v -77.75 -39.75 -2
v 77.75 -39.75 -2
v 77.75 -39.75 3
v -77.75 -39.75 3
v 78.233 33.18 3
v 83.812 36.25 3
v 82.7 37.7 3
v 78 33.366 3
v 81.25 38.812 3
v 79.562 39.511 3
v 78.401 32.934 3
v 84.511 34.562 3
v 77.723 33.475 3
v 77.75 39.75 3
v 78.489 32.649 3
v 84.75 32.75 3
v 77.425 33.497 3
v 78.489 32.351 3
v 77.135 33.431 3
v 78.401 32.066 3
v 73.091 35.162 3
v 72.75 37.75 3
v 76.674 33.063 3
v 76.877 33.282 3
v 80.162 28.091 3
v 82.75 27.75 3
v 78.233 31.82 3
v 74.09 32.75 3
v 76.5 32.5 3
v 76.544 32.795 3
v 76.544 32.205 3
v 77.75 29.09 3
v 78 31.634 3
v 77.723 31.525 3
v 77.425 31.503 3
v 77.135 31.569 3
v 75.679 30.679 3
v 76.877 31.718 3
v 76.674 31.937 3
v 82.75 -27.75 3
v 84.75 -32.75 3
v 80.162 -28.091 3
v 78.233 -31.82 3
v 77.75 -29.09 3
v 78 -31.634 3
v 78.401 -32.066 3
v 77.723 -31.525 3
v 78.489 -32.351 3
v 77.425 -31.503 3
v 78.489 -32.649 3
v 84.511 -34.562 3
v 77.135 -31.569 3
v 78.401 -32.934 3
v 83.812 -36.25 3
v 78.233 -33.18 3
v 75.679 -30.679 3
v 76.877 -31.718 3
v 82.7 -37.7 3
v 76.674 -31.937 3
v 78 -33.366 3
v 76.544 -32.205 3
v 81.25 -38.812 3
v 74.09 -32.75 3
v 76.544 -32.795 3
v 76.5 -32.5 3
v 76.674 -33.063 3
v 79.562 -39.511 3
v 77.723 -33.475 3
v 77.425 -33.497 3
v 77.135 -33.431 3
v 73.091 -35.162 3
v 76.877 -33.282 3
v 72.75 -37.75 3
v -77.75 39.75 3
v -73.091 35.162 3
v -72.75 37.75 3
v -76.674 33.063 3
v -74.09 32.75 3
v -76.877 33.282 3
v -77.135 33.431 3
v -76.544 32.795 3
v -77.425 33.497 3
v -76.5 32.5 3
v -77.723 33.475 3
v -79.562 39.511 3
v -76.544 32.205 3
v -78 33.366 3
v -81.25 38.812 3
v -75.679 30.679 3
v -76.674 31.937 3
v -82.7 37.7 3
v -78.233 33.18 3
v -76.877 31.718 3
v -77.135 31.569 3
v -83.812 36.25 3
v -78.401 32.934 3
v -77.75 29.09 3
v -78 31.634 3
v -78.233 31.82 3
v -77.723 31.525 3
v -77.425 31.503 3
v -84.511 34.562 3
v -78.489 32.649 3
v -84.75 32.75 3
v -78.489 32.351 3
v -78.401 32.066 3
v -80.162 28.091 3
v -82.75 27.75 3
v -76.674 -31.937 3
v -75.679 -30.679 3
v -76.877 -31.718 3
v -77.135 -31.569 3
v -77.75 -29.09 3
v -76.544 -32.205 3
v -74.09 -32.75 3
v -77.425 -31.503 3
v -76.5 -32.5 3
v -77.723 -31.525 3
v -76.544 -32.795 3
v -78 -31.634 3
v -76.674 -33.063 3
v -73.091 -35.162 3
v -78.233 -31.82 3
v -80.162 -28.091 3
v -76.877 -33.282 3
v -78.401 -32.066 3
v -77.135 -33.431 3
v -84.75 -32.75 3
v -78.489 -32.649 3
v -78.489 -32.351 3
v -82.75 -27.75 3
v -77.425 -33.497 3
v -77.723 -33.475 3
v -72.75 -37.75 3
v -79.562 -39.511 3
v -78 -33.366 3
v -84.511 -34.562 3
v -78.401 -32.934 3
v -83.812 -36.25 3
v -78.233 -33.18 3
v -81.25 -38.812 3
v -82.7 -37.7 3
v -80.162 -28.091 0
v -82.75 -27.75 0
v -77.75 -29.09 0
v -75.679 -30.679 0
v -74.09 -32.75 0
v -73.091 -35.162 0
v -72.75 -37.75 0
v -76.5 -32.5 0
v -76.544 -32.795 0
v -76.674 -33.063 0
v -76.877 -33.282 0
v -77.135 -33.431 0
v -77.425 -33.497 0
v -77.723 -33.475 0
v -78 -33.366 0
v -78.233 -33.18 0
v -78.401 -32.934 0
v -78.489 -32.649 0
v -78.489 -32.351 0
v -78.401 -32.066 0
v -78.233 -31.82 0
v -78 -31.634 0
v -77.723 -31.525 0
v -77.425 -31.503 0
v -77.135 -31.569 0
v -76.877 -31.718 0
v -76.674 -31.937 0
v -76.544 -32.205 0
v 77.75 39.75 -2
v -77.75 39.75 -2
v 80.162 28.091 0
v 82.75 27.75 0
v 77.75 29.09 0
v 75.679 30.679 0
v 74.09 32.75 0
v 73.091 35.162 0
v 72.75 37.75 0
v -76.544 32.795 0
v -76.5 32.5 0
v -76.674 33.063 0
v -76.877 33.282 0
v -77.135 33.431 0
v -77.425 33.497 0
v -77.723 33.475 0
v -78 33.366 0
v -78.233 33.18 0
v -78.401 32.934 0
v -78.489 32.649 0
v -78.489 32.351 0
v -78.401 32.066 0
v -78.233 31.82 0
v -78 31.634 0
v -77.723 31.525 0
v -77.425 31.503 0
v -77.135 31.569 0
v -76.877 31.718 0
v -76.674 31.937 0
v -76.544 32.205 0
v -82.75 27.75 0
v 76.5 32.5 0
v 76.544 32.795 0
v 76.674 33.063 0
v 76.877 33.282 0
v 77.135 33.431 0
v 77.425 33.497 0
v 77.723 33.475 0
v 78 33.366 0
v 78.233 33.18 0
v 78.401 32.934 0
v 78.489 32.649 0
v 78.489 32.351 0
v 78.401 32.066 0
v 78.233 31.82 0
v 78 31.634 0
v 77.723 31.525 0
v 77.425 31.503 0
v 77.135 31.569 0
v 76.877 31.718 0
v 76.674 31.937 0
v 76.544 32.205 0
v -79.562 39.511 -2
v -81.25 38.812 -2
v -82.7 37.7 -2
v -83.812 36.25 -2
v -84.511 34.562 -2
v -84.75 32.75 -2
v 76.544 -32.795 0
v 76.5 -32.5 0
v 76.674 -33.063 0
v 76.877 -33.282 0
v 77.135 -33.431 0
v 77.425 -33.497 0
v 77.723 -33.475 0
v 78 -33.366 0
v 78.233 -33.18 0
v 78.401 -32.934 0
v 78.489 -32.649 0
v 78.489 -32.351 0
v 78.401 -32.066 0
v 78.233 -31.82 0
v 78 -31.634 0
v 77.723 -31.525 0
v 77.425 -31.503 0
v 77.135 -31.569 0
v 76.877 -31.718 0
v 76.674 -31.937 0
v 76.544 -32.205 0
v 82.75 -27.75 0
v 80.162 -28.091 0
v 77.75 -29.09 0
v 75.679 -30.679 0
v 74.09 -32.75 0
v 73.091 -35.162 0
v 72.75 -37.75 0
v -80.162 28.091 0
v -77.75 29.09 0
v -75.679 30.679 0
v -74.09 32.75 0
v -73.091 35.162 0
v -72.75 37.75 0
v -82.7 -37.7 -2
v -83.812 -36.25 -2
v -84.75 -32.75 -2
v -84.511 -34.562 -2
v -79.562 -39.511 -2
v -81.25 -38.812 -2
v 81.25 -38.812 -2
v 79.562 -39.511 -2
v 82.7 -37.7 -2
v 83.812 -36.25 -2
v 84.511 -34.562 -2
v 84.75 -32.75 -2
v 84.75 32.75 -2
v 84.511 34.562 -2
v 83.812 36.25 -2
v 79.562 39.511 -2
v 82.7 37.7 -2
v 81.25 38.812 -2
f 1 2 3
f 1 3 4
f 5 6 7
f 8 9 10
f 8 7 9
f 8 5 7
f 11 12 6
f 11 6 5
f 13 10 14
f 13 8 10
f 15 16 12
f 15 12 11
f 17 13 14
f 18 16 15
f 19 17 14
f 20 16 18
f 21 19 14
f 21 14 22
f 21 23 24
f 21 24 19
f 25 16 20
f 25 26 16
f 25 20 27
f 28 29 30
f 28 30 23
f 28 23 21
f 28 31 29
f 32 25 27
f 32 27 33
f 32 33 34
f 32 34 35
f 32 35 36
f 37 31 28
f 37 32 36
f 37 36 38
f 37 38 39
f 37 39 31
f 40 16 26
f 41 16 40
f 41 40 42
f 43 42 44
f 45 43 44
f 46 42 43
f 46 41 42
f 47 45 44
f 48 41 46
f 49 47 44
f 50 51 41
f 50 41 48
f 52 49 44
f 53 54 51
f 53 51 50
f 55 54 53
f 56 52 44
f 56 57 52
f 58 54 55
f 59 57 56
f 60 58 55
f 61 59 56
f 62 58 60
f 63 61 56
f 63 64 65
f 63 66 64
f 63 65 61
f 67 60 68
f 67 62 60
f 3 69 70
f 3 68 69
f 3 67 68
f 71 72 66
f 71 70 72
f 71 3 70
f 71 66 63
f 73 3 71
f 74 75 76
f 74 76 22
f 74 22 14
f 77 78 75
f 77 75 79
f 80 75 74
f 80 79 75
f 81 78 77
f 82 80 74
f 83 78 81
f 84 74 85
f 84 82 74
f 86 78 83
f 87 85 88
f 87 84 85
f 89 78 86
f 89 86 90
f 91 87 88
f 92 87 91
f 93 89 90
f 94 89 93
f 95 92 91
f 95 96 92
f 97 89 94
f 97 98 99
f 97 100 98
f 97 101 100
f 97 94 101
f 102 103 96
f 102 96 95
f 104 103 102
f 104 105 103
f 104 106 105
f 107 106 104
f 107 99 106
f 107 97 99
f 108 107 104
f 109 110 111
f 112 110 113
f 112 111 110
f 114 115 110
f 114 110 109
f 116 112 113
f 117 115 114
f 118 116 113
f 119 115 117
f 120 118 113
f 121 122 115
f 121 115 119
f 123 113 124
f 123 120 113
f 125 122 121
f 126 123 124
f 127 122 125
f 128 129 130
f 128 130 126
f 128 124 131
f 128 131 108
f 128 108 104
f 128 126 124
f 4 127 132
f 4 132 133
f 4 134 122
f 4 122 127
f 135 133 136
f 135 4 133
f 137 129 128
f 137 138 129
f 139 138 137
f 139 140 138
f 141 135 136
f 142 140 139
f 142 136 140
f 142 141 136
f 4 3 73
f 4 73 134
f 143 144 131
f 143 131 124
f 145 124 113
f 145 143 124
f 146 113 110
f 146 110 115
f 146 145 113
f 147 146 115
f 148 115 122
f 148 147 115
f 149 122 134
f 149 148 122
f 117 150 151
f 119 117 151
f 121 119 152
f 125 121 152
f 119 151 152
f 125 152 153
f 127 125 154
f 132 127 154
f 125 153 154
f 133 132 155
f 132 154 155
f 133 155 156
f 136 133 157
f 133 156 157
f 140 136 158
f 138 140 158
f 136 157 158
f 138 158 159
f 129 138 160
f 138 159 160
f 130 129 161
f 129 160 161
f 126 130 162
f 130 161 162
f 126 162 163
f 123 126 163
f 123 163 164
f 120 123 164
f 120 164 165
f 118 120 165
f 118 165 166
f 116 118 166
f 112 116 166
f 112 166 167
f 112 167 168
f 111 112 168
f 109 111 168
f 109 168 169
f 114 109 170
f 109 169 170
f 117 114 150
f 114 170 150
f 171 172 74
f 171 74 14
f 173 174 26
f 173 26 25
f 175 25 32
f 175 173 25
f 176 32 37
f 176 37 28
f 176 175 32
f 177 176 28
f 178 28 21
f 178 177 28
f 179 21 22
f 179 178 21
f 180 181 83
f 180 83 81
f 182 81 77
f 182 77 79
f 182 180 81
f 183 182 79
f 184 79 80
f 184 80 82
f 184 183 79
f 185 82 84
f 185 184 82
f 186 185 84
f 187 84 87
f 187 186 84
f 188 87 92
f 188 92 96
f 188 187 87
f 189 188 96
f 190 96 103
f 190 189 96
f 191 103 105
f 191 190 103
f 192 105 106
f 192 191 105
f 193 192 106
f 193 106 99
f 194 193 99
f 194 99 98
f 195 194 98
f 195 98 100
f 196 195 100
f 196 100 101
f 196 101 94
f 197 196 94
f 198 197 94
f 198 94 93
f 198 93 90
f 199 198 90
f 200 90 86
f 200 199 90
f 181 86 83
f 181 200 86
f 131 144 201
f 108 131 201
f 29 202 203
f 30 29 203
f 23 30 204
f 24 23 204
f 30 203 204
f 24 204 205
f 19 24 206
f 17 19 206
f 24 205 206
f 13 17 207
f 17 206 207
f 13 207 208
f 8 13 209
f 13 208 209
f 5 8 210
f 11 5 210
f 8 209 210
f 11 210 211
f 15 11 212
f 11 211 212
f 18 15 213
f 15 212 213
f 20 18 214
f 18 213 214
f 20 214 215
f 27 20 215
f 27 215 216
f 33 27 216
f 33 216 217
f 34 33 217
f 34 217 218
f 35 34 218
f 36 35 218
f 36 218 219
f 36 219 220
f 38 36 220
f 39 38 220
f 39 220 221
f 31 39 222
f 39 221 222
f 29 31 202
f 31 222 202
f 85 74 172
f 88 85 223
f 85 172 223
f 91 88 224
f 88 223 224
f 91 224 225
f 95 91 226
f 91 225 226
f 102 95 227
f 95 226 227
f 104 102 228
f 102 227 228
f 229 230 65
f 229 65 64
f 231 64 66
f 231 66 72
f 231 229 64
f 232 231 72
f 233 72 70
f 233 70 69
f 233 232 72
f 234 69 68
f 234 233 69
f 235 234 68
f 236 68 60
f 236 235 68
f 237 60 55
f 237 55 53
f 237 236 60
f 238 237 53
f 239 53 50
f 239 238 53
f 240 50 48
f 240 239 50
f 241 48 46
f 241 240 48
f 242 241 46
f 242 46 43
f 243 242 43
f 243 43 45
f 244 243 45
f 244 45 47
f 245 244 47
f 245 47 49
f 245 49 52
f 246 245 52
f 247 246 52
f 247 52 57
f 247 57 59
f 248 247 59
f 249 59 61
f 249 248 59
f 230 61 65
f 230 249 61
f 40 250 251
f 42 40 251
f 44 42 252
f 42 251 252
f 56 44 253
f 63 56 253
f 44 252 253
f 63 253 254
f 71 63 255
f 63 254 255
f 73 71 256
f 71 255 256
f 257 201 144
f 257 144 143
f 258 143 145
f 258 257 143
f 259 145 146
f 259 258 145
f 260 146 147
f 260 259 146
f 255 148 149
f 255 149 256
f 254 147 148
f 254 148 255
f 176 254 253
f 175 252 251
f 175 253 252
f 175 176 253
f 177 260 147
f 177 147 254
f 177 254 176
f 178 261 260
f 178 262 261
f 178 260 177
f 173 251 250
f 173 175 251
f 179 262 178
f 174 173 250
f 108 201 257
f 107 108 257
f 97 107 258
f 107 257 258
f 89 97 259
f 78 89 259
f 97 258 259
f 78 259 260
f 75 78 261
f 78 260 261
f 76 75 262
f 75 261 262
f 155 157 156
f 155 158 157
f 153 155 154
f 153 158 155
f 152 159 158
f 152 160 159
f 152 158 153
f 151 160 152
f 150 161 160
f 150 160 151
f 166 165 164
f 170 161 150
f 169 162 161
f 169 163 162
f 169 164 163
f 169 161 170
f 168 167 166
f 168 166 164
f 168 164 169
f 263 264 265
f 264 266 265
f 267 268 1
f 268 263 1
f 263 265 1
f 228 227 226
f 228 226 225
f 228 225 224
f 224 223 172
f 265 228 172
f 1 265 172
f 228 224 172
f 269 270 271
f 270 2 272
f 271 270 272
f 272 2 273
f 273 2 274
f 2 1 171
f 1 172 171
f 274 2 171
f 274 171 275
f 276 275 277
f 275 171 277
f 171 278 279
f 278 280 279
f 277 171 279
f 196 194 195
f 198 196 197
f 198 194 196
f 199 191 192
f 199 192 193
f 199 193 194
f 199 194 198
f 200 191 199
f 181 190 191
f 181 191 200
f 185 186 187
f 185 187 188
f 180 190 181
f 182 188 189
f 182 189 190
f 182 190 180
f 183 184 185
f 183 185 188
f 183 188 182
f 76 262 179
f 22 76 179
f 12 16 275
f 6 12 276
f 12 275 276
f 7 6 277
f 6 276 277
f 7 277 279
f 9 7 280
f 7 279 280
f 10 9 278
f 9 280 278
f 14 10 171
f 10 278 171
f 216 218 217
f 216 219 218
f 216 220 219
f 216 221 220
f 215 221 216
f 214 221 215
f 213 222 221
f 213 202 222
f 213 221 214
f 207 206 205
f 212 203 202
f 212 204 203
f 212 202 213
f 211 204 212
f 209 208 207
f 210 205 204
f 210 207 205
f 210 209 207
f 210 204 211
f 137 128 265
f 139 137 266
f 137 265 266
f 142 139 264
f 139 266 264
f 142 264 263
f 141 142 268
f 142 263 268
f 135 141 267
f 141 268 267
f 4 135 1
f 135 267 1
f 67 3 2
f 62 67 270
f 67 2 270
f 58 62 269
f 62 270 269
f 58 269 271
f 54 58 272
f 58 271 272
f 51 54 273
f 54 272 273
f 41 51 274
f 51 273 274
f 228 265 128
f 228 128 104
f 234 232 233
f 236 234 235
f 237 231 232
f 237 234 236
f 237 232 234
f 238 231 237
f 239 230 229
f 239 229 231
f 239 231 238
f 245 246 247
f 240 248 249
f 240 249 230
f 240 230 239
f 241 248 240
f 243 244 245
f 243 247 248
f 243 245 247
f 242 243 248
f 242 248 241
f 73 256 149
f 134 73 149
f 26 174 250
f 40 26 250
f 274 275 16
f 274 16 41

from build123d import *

# Parameters (mm, degrees)
PAD_DEPTH               = 3
THICKNESS_T             = 2
SKETCH001_R             = 1
PAD001_DEPTH            = 3
SKETCH001_MIRRORED_2_R  = 1
PAD001_MIRRORED_2_DEPTH = 3


with BuildPart() as part:
    # Sketch → Pad (new body)
    with BuildSketch(Plane.XY):
        with BuildLine():
            ThreePointArc((-77.75, 37.75), (-81.285534, 36.285534), (-82.75, 32.75))
            Line((-82.75, -32.75), (-82.75, 32.75))
            ThreePointArc((-82.75, -32.75), (-81.285534, -36.285534), (-77.75, -37.75))
            Line((77.75, -37.75), (-77.75, -37.75))
            ThreePointArc((77.75, -37.75), (81.285534, -36.285534), (82.75, -32.75))
            Line((82.75, 32.75), (82.75, -32.75))
            ThreePointArc((82.75, 32.75), (81.285534, 36.285534), (77.75, 37.75))
            Line((-77.75, 37.75), (77.75, 37.75))
        make_face()
    extrude(amount=PAD_DEPTH)

    # Thickness
    thickness_openings = [part.faces().sort_by_distance(p)[0] for p in [
        (0, 0, 3),
    ]]
    offset(amount=THICKNESS_T, openings=thickness_openings, kind=Kind.INTERSECTION)

    # Sketch001 (on Face9 of Thickness) → Pad001 (join)
    with BuildSketch(Plane.XY):
        with BuildLine():
            Line((-82.75, 32.75), (-82.75, 27.75))
            ThreePointArc((-82.75, 27.75), (-75.678932, 30.678932), (-72.75, 37.75))
            Line((-77.75, 37.75), (-72.75, 37.75))
            ThreePointArc((-77.75, 37.75), (-81.285534, 36.285534), (-82.75, 32.75))
        make_face()
        with Locations((-77.5, 32.5)):
            Circle(SKETCH001_R, mode=Mode.SUBTRACT)
    pad001 = extrude(amount=PAD001_DEPTH)

    # Sketch001 Mirrored 2 → Pad001 Mirrored 2 (add)
    with BuildSketch(Plane(origin=(0, 0, 0), x_dir=(-1, 0, 0), z_dir=(0, 0, -1))):
        with BuildLine():
            Line((-82.75, 32.75), (-82.75, 27.75))
            ThreePointArc((-82.75, 27.75), (-75.678932, 30.678932), (-72.75, 37.75))
            Line((-77.75, 37.75), (-72.75, 37.75))
            ThreePointArc((-77.75, 37.75), (-81.285534, 36.285534), (-82.75, 32.75))
        make_face()
        with Locations((-77.5, 32.5)):
            Circle(SKETCH001_MIRRORED_2_R, mode=Mode.SUBTRACT)
    pad001_mirrored_2 = extrude(amount=-PAD001_MIRRORED_2_DEPTH)

    # Mirrored001: Pad001, Pad001 Mirrored 2 across Sketch001 H_Axis
    add(pad001.mirror(Plane.ZX))
    add(pad001_mirrored_2.mirror(Plane.ZX))


solid = part.part
